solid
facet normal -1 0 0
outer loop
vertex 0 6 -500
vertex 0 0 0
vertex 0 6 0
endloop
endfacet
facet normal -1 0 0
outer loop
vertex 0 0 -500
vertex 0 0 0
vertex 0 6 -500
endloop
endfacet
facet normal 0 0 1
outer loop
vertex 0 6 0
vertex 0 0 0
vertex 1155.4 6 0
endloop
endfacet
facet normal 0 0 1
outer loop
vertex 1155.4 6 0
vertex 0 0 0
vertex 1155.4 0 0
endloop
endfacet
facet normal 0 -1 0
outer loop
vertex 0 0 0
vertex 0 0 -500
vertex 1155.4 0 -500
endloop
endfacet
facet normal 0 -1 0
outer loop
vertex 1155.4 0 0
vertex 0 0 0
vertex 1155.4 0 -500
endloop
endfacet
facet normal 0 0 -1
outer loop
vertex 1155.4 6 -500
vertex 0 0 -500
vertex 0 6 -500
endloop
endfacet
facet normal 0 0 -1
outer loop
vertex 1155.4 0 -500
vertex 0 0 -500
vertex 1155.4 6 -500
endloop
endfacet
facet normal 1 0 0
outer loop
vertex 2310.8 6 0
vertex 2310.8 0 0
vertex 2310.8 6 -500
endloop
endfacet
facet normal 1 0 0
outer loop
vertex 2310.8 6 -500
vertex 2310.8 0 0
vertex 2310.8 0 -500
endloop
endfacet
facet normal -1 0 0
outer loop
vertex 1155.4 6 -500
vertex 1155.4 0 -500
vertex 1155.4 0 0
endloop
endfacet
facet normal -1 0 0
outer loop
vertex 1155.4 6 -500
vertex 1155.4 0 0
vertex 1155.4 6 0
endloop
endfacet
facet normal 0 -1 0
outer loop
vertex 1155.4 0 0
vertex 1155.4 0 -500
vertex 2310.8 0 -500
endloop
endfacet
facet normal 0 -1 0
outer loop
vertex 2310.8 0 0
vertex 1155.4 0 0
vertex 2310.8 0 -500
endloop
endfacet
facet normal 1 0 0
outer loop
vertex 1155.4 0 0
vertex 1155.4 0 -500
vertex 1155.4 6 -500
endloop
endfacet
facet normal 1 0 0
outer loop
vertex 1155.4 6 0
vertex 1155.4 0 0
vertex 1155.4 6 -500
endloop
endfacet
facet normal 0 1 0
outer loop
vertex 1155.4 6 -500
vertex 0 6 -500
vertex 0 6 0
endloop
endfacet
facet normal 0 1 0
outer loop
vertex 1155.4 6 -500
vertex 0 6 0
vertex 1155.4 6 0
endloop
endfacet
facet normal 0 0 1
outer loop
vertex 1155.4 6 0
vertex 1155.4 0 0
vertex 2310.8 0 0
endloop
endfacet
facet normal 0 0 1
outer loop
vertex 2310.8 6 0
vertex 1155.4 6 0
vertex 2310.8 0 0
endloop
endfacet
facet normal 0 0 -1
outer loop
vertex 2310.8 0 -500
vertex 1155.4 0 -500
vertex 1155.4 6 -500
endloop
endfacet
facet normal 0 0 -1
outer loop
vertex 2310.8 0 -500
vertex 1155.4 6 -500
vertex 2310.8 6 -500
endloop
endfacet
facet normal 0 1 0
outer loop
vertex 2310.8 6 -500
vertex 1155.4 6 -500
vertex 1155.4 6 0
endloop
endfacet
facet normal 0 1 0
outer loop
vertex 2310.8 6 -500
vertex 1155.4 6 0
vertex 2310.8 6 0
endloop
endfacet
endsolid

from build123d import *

# Parameters (mm, degrees)
SKETCH1_W           = 2310.8
SKETCH1_H           = 500
BOSS_EXTRUDE1_DEPTH = 6


# Read off the part's stored shape, not the designer's step: Split2
with BuildPart() as part:
    # Sketch1 → Boss-Extrude1 (new body)
    with BuildSketch(Plane(origin=(0, 0, 0), x_dir=(1, 0, 0), z_dir=(0, 1, 0))):
        with Locations((1155.4, 250)):
            Rectangle(SKETCH1_W, SKETCH1_H)
    extrude(amount=BOSS_EXTRUDE1_DEPTH)


with BuildPart() as body_2:
    # Split2: the piece on the far side of the plane
    add(part.part)
    split(bisect_by=Plane.YZ.offset(1155.4), keep=Keep.BOTTOM)


with BuildPart() as part_1:
    add(part.part)

    # Split2
    split(bisect_by=Plane.YZ.offset(1155.4), keep=Keep.TOP)


solid = Compound([body_2.part, part_1.part])
